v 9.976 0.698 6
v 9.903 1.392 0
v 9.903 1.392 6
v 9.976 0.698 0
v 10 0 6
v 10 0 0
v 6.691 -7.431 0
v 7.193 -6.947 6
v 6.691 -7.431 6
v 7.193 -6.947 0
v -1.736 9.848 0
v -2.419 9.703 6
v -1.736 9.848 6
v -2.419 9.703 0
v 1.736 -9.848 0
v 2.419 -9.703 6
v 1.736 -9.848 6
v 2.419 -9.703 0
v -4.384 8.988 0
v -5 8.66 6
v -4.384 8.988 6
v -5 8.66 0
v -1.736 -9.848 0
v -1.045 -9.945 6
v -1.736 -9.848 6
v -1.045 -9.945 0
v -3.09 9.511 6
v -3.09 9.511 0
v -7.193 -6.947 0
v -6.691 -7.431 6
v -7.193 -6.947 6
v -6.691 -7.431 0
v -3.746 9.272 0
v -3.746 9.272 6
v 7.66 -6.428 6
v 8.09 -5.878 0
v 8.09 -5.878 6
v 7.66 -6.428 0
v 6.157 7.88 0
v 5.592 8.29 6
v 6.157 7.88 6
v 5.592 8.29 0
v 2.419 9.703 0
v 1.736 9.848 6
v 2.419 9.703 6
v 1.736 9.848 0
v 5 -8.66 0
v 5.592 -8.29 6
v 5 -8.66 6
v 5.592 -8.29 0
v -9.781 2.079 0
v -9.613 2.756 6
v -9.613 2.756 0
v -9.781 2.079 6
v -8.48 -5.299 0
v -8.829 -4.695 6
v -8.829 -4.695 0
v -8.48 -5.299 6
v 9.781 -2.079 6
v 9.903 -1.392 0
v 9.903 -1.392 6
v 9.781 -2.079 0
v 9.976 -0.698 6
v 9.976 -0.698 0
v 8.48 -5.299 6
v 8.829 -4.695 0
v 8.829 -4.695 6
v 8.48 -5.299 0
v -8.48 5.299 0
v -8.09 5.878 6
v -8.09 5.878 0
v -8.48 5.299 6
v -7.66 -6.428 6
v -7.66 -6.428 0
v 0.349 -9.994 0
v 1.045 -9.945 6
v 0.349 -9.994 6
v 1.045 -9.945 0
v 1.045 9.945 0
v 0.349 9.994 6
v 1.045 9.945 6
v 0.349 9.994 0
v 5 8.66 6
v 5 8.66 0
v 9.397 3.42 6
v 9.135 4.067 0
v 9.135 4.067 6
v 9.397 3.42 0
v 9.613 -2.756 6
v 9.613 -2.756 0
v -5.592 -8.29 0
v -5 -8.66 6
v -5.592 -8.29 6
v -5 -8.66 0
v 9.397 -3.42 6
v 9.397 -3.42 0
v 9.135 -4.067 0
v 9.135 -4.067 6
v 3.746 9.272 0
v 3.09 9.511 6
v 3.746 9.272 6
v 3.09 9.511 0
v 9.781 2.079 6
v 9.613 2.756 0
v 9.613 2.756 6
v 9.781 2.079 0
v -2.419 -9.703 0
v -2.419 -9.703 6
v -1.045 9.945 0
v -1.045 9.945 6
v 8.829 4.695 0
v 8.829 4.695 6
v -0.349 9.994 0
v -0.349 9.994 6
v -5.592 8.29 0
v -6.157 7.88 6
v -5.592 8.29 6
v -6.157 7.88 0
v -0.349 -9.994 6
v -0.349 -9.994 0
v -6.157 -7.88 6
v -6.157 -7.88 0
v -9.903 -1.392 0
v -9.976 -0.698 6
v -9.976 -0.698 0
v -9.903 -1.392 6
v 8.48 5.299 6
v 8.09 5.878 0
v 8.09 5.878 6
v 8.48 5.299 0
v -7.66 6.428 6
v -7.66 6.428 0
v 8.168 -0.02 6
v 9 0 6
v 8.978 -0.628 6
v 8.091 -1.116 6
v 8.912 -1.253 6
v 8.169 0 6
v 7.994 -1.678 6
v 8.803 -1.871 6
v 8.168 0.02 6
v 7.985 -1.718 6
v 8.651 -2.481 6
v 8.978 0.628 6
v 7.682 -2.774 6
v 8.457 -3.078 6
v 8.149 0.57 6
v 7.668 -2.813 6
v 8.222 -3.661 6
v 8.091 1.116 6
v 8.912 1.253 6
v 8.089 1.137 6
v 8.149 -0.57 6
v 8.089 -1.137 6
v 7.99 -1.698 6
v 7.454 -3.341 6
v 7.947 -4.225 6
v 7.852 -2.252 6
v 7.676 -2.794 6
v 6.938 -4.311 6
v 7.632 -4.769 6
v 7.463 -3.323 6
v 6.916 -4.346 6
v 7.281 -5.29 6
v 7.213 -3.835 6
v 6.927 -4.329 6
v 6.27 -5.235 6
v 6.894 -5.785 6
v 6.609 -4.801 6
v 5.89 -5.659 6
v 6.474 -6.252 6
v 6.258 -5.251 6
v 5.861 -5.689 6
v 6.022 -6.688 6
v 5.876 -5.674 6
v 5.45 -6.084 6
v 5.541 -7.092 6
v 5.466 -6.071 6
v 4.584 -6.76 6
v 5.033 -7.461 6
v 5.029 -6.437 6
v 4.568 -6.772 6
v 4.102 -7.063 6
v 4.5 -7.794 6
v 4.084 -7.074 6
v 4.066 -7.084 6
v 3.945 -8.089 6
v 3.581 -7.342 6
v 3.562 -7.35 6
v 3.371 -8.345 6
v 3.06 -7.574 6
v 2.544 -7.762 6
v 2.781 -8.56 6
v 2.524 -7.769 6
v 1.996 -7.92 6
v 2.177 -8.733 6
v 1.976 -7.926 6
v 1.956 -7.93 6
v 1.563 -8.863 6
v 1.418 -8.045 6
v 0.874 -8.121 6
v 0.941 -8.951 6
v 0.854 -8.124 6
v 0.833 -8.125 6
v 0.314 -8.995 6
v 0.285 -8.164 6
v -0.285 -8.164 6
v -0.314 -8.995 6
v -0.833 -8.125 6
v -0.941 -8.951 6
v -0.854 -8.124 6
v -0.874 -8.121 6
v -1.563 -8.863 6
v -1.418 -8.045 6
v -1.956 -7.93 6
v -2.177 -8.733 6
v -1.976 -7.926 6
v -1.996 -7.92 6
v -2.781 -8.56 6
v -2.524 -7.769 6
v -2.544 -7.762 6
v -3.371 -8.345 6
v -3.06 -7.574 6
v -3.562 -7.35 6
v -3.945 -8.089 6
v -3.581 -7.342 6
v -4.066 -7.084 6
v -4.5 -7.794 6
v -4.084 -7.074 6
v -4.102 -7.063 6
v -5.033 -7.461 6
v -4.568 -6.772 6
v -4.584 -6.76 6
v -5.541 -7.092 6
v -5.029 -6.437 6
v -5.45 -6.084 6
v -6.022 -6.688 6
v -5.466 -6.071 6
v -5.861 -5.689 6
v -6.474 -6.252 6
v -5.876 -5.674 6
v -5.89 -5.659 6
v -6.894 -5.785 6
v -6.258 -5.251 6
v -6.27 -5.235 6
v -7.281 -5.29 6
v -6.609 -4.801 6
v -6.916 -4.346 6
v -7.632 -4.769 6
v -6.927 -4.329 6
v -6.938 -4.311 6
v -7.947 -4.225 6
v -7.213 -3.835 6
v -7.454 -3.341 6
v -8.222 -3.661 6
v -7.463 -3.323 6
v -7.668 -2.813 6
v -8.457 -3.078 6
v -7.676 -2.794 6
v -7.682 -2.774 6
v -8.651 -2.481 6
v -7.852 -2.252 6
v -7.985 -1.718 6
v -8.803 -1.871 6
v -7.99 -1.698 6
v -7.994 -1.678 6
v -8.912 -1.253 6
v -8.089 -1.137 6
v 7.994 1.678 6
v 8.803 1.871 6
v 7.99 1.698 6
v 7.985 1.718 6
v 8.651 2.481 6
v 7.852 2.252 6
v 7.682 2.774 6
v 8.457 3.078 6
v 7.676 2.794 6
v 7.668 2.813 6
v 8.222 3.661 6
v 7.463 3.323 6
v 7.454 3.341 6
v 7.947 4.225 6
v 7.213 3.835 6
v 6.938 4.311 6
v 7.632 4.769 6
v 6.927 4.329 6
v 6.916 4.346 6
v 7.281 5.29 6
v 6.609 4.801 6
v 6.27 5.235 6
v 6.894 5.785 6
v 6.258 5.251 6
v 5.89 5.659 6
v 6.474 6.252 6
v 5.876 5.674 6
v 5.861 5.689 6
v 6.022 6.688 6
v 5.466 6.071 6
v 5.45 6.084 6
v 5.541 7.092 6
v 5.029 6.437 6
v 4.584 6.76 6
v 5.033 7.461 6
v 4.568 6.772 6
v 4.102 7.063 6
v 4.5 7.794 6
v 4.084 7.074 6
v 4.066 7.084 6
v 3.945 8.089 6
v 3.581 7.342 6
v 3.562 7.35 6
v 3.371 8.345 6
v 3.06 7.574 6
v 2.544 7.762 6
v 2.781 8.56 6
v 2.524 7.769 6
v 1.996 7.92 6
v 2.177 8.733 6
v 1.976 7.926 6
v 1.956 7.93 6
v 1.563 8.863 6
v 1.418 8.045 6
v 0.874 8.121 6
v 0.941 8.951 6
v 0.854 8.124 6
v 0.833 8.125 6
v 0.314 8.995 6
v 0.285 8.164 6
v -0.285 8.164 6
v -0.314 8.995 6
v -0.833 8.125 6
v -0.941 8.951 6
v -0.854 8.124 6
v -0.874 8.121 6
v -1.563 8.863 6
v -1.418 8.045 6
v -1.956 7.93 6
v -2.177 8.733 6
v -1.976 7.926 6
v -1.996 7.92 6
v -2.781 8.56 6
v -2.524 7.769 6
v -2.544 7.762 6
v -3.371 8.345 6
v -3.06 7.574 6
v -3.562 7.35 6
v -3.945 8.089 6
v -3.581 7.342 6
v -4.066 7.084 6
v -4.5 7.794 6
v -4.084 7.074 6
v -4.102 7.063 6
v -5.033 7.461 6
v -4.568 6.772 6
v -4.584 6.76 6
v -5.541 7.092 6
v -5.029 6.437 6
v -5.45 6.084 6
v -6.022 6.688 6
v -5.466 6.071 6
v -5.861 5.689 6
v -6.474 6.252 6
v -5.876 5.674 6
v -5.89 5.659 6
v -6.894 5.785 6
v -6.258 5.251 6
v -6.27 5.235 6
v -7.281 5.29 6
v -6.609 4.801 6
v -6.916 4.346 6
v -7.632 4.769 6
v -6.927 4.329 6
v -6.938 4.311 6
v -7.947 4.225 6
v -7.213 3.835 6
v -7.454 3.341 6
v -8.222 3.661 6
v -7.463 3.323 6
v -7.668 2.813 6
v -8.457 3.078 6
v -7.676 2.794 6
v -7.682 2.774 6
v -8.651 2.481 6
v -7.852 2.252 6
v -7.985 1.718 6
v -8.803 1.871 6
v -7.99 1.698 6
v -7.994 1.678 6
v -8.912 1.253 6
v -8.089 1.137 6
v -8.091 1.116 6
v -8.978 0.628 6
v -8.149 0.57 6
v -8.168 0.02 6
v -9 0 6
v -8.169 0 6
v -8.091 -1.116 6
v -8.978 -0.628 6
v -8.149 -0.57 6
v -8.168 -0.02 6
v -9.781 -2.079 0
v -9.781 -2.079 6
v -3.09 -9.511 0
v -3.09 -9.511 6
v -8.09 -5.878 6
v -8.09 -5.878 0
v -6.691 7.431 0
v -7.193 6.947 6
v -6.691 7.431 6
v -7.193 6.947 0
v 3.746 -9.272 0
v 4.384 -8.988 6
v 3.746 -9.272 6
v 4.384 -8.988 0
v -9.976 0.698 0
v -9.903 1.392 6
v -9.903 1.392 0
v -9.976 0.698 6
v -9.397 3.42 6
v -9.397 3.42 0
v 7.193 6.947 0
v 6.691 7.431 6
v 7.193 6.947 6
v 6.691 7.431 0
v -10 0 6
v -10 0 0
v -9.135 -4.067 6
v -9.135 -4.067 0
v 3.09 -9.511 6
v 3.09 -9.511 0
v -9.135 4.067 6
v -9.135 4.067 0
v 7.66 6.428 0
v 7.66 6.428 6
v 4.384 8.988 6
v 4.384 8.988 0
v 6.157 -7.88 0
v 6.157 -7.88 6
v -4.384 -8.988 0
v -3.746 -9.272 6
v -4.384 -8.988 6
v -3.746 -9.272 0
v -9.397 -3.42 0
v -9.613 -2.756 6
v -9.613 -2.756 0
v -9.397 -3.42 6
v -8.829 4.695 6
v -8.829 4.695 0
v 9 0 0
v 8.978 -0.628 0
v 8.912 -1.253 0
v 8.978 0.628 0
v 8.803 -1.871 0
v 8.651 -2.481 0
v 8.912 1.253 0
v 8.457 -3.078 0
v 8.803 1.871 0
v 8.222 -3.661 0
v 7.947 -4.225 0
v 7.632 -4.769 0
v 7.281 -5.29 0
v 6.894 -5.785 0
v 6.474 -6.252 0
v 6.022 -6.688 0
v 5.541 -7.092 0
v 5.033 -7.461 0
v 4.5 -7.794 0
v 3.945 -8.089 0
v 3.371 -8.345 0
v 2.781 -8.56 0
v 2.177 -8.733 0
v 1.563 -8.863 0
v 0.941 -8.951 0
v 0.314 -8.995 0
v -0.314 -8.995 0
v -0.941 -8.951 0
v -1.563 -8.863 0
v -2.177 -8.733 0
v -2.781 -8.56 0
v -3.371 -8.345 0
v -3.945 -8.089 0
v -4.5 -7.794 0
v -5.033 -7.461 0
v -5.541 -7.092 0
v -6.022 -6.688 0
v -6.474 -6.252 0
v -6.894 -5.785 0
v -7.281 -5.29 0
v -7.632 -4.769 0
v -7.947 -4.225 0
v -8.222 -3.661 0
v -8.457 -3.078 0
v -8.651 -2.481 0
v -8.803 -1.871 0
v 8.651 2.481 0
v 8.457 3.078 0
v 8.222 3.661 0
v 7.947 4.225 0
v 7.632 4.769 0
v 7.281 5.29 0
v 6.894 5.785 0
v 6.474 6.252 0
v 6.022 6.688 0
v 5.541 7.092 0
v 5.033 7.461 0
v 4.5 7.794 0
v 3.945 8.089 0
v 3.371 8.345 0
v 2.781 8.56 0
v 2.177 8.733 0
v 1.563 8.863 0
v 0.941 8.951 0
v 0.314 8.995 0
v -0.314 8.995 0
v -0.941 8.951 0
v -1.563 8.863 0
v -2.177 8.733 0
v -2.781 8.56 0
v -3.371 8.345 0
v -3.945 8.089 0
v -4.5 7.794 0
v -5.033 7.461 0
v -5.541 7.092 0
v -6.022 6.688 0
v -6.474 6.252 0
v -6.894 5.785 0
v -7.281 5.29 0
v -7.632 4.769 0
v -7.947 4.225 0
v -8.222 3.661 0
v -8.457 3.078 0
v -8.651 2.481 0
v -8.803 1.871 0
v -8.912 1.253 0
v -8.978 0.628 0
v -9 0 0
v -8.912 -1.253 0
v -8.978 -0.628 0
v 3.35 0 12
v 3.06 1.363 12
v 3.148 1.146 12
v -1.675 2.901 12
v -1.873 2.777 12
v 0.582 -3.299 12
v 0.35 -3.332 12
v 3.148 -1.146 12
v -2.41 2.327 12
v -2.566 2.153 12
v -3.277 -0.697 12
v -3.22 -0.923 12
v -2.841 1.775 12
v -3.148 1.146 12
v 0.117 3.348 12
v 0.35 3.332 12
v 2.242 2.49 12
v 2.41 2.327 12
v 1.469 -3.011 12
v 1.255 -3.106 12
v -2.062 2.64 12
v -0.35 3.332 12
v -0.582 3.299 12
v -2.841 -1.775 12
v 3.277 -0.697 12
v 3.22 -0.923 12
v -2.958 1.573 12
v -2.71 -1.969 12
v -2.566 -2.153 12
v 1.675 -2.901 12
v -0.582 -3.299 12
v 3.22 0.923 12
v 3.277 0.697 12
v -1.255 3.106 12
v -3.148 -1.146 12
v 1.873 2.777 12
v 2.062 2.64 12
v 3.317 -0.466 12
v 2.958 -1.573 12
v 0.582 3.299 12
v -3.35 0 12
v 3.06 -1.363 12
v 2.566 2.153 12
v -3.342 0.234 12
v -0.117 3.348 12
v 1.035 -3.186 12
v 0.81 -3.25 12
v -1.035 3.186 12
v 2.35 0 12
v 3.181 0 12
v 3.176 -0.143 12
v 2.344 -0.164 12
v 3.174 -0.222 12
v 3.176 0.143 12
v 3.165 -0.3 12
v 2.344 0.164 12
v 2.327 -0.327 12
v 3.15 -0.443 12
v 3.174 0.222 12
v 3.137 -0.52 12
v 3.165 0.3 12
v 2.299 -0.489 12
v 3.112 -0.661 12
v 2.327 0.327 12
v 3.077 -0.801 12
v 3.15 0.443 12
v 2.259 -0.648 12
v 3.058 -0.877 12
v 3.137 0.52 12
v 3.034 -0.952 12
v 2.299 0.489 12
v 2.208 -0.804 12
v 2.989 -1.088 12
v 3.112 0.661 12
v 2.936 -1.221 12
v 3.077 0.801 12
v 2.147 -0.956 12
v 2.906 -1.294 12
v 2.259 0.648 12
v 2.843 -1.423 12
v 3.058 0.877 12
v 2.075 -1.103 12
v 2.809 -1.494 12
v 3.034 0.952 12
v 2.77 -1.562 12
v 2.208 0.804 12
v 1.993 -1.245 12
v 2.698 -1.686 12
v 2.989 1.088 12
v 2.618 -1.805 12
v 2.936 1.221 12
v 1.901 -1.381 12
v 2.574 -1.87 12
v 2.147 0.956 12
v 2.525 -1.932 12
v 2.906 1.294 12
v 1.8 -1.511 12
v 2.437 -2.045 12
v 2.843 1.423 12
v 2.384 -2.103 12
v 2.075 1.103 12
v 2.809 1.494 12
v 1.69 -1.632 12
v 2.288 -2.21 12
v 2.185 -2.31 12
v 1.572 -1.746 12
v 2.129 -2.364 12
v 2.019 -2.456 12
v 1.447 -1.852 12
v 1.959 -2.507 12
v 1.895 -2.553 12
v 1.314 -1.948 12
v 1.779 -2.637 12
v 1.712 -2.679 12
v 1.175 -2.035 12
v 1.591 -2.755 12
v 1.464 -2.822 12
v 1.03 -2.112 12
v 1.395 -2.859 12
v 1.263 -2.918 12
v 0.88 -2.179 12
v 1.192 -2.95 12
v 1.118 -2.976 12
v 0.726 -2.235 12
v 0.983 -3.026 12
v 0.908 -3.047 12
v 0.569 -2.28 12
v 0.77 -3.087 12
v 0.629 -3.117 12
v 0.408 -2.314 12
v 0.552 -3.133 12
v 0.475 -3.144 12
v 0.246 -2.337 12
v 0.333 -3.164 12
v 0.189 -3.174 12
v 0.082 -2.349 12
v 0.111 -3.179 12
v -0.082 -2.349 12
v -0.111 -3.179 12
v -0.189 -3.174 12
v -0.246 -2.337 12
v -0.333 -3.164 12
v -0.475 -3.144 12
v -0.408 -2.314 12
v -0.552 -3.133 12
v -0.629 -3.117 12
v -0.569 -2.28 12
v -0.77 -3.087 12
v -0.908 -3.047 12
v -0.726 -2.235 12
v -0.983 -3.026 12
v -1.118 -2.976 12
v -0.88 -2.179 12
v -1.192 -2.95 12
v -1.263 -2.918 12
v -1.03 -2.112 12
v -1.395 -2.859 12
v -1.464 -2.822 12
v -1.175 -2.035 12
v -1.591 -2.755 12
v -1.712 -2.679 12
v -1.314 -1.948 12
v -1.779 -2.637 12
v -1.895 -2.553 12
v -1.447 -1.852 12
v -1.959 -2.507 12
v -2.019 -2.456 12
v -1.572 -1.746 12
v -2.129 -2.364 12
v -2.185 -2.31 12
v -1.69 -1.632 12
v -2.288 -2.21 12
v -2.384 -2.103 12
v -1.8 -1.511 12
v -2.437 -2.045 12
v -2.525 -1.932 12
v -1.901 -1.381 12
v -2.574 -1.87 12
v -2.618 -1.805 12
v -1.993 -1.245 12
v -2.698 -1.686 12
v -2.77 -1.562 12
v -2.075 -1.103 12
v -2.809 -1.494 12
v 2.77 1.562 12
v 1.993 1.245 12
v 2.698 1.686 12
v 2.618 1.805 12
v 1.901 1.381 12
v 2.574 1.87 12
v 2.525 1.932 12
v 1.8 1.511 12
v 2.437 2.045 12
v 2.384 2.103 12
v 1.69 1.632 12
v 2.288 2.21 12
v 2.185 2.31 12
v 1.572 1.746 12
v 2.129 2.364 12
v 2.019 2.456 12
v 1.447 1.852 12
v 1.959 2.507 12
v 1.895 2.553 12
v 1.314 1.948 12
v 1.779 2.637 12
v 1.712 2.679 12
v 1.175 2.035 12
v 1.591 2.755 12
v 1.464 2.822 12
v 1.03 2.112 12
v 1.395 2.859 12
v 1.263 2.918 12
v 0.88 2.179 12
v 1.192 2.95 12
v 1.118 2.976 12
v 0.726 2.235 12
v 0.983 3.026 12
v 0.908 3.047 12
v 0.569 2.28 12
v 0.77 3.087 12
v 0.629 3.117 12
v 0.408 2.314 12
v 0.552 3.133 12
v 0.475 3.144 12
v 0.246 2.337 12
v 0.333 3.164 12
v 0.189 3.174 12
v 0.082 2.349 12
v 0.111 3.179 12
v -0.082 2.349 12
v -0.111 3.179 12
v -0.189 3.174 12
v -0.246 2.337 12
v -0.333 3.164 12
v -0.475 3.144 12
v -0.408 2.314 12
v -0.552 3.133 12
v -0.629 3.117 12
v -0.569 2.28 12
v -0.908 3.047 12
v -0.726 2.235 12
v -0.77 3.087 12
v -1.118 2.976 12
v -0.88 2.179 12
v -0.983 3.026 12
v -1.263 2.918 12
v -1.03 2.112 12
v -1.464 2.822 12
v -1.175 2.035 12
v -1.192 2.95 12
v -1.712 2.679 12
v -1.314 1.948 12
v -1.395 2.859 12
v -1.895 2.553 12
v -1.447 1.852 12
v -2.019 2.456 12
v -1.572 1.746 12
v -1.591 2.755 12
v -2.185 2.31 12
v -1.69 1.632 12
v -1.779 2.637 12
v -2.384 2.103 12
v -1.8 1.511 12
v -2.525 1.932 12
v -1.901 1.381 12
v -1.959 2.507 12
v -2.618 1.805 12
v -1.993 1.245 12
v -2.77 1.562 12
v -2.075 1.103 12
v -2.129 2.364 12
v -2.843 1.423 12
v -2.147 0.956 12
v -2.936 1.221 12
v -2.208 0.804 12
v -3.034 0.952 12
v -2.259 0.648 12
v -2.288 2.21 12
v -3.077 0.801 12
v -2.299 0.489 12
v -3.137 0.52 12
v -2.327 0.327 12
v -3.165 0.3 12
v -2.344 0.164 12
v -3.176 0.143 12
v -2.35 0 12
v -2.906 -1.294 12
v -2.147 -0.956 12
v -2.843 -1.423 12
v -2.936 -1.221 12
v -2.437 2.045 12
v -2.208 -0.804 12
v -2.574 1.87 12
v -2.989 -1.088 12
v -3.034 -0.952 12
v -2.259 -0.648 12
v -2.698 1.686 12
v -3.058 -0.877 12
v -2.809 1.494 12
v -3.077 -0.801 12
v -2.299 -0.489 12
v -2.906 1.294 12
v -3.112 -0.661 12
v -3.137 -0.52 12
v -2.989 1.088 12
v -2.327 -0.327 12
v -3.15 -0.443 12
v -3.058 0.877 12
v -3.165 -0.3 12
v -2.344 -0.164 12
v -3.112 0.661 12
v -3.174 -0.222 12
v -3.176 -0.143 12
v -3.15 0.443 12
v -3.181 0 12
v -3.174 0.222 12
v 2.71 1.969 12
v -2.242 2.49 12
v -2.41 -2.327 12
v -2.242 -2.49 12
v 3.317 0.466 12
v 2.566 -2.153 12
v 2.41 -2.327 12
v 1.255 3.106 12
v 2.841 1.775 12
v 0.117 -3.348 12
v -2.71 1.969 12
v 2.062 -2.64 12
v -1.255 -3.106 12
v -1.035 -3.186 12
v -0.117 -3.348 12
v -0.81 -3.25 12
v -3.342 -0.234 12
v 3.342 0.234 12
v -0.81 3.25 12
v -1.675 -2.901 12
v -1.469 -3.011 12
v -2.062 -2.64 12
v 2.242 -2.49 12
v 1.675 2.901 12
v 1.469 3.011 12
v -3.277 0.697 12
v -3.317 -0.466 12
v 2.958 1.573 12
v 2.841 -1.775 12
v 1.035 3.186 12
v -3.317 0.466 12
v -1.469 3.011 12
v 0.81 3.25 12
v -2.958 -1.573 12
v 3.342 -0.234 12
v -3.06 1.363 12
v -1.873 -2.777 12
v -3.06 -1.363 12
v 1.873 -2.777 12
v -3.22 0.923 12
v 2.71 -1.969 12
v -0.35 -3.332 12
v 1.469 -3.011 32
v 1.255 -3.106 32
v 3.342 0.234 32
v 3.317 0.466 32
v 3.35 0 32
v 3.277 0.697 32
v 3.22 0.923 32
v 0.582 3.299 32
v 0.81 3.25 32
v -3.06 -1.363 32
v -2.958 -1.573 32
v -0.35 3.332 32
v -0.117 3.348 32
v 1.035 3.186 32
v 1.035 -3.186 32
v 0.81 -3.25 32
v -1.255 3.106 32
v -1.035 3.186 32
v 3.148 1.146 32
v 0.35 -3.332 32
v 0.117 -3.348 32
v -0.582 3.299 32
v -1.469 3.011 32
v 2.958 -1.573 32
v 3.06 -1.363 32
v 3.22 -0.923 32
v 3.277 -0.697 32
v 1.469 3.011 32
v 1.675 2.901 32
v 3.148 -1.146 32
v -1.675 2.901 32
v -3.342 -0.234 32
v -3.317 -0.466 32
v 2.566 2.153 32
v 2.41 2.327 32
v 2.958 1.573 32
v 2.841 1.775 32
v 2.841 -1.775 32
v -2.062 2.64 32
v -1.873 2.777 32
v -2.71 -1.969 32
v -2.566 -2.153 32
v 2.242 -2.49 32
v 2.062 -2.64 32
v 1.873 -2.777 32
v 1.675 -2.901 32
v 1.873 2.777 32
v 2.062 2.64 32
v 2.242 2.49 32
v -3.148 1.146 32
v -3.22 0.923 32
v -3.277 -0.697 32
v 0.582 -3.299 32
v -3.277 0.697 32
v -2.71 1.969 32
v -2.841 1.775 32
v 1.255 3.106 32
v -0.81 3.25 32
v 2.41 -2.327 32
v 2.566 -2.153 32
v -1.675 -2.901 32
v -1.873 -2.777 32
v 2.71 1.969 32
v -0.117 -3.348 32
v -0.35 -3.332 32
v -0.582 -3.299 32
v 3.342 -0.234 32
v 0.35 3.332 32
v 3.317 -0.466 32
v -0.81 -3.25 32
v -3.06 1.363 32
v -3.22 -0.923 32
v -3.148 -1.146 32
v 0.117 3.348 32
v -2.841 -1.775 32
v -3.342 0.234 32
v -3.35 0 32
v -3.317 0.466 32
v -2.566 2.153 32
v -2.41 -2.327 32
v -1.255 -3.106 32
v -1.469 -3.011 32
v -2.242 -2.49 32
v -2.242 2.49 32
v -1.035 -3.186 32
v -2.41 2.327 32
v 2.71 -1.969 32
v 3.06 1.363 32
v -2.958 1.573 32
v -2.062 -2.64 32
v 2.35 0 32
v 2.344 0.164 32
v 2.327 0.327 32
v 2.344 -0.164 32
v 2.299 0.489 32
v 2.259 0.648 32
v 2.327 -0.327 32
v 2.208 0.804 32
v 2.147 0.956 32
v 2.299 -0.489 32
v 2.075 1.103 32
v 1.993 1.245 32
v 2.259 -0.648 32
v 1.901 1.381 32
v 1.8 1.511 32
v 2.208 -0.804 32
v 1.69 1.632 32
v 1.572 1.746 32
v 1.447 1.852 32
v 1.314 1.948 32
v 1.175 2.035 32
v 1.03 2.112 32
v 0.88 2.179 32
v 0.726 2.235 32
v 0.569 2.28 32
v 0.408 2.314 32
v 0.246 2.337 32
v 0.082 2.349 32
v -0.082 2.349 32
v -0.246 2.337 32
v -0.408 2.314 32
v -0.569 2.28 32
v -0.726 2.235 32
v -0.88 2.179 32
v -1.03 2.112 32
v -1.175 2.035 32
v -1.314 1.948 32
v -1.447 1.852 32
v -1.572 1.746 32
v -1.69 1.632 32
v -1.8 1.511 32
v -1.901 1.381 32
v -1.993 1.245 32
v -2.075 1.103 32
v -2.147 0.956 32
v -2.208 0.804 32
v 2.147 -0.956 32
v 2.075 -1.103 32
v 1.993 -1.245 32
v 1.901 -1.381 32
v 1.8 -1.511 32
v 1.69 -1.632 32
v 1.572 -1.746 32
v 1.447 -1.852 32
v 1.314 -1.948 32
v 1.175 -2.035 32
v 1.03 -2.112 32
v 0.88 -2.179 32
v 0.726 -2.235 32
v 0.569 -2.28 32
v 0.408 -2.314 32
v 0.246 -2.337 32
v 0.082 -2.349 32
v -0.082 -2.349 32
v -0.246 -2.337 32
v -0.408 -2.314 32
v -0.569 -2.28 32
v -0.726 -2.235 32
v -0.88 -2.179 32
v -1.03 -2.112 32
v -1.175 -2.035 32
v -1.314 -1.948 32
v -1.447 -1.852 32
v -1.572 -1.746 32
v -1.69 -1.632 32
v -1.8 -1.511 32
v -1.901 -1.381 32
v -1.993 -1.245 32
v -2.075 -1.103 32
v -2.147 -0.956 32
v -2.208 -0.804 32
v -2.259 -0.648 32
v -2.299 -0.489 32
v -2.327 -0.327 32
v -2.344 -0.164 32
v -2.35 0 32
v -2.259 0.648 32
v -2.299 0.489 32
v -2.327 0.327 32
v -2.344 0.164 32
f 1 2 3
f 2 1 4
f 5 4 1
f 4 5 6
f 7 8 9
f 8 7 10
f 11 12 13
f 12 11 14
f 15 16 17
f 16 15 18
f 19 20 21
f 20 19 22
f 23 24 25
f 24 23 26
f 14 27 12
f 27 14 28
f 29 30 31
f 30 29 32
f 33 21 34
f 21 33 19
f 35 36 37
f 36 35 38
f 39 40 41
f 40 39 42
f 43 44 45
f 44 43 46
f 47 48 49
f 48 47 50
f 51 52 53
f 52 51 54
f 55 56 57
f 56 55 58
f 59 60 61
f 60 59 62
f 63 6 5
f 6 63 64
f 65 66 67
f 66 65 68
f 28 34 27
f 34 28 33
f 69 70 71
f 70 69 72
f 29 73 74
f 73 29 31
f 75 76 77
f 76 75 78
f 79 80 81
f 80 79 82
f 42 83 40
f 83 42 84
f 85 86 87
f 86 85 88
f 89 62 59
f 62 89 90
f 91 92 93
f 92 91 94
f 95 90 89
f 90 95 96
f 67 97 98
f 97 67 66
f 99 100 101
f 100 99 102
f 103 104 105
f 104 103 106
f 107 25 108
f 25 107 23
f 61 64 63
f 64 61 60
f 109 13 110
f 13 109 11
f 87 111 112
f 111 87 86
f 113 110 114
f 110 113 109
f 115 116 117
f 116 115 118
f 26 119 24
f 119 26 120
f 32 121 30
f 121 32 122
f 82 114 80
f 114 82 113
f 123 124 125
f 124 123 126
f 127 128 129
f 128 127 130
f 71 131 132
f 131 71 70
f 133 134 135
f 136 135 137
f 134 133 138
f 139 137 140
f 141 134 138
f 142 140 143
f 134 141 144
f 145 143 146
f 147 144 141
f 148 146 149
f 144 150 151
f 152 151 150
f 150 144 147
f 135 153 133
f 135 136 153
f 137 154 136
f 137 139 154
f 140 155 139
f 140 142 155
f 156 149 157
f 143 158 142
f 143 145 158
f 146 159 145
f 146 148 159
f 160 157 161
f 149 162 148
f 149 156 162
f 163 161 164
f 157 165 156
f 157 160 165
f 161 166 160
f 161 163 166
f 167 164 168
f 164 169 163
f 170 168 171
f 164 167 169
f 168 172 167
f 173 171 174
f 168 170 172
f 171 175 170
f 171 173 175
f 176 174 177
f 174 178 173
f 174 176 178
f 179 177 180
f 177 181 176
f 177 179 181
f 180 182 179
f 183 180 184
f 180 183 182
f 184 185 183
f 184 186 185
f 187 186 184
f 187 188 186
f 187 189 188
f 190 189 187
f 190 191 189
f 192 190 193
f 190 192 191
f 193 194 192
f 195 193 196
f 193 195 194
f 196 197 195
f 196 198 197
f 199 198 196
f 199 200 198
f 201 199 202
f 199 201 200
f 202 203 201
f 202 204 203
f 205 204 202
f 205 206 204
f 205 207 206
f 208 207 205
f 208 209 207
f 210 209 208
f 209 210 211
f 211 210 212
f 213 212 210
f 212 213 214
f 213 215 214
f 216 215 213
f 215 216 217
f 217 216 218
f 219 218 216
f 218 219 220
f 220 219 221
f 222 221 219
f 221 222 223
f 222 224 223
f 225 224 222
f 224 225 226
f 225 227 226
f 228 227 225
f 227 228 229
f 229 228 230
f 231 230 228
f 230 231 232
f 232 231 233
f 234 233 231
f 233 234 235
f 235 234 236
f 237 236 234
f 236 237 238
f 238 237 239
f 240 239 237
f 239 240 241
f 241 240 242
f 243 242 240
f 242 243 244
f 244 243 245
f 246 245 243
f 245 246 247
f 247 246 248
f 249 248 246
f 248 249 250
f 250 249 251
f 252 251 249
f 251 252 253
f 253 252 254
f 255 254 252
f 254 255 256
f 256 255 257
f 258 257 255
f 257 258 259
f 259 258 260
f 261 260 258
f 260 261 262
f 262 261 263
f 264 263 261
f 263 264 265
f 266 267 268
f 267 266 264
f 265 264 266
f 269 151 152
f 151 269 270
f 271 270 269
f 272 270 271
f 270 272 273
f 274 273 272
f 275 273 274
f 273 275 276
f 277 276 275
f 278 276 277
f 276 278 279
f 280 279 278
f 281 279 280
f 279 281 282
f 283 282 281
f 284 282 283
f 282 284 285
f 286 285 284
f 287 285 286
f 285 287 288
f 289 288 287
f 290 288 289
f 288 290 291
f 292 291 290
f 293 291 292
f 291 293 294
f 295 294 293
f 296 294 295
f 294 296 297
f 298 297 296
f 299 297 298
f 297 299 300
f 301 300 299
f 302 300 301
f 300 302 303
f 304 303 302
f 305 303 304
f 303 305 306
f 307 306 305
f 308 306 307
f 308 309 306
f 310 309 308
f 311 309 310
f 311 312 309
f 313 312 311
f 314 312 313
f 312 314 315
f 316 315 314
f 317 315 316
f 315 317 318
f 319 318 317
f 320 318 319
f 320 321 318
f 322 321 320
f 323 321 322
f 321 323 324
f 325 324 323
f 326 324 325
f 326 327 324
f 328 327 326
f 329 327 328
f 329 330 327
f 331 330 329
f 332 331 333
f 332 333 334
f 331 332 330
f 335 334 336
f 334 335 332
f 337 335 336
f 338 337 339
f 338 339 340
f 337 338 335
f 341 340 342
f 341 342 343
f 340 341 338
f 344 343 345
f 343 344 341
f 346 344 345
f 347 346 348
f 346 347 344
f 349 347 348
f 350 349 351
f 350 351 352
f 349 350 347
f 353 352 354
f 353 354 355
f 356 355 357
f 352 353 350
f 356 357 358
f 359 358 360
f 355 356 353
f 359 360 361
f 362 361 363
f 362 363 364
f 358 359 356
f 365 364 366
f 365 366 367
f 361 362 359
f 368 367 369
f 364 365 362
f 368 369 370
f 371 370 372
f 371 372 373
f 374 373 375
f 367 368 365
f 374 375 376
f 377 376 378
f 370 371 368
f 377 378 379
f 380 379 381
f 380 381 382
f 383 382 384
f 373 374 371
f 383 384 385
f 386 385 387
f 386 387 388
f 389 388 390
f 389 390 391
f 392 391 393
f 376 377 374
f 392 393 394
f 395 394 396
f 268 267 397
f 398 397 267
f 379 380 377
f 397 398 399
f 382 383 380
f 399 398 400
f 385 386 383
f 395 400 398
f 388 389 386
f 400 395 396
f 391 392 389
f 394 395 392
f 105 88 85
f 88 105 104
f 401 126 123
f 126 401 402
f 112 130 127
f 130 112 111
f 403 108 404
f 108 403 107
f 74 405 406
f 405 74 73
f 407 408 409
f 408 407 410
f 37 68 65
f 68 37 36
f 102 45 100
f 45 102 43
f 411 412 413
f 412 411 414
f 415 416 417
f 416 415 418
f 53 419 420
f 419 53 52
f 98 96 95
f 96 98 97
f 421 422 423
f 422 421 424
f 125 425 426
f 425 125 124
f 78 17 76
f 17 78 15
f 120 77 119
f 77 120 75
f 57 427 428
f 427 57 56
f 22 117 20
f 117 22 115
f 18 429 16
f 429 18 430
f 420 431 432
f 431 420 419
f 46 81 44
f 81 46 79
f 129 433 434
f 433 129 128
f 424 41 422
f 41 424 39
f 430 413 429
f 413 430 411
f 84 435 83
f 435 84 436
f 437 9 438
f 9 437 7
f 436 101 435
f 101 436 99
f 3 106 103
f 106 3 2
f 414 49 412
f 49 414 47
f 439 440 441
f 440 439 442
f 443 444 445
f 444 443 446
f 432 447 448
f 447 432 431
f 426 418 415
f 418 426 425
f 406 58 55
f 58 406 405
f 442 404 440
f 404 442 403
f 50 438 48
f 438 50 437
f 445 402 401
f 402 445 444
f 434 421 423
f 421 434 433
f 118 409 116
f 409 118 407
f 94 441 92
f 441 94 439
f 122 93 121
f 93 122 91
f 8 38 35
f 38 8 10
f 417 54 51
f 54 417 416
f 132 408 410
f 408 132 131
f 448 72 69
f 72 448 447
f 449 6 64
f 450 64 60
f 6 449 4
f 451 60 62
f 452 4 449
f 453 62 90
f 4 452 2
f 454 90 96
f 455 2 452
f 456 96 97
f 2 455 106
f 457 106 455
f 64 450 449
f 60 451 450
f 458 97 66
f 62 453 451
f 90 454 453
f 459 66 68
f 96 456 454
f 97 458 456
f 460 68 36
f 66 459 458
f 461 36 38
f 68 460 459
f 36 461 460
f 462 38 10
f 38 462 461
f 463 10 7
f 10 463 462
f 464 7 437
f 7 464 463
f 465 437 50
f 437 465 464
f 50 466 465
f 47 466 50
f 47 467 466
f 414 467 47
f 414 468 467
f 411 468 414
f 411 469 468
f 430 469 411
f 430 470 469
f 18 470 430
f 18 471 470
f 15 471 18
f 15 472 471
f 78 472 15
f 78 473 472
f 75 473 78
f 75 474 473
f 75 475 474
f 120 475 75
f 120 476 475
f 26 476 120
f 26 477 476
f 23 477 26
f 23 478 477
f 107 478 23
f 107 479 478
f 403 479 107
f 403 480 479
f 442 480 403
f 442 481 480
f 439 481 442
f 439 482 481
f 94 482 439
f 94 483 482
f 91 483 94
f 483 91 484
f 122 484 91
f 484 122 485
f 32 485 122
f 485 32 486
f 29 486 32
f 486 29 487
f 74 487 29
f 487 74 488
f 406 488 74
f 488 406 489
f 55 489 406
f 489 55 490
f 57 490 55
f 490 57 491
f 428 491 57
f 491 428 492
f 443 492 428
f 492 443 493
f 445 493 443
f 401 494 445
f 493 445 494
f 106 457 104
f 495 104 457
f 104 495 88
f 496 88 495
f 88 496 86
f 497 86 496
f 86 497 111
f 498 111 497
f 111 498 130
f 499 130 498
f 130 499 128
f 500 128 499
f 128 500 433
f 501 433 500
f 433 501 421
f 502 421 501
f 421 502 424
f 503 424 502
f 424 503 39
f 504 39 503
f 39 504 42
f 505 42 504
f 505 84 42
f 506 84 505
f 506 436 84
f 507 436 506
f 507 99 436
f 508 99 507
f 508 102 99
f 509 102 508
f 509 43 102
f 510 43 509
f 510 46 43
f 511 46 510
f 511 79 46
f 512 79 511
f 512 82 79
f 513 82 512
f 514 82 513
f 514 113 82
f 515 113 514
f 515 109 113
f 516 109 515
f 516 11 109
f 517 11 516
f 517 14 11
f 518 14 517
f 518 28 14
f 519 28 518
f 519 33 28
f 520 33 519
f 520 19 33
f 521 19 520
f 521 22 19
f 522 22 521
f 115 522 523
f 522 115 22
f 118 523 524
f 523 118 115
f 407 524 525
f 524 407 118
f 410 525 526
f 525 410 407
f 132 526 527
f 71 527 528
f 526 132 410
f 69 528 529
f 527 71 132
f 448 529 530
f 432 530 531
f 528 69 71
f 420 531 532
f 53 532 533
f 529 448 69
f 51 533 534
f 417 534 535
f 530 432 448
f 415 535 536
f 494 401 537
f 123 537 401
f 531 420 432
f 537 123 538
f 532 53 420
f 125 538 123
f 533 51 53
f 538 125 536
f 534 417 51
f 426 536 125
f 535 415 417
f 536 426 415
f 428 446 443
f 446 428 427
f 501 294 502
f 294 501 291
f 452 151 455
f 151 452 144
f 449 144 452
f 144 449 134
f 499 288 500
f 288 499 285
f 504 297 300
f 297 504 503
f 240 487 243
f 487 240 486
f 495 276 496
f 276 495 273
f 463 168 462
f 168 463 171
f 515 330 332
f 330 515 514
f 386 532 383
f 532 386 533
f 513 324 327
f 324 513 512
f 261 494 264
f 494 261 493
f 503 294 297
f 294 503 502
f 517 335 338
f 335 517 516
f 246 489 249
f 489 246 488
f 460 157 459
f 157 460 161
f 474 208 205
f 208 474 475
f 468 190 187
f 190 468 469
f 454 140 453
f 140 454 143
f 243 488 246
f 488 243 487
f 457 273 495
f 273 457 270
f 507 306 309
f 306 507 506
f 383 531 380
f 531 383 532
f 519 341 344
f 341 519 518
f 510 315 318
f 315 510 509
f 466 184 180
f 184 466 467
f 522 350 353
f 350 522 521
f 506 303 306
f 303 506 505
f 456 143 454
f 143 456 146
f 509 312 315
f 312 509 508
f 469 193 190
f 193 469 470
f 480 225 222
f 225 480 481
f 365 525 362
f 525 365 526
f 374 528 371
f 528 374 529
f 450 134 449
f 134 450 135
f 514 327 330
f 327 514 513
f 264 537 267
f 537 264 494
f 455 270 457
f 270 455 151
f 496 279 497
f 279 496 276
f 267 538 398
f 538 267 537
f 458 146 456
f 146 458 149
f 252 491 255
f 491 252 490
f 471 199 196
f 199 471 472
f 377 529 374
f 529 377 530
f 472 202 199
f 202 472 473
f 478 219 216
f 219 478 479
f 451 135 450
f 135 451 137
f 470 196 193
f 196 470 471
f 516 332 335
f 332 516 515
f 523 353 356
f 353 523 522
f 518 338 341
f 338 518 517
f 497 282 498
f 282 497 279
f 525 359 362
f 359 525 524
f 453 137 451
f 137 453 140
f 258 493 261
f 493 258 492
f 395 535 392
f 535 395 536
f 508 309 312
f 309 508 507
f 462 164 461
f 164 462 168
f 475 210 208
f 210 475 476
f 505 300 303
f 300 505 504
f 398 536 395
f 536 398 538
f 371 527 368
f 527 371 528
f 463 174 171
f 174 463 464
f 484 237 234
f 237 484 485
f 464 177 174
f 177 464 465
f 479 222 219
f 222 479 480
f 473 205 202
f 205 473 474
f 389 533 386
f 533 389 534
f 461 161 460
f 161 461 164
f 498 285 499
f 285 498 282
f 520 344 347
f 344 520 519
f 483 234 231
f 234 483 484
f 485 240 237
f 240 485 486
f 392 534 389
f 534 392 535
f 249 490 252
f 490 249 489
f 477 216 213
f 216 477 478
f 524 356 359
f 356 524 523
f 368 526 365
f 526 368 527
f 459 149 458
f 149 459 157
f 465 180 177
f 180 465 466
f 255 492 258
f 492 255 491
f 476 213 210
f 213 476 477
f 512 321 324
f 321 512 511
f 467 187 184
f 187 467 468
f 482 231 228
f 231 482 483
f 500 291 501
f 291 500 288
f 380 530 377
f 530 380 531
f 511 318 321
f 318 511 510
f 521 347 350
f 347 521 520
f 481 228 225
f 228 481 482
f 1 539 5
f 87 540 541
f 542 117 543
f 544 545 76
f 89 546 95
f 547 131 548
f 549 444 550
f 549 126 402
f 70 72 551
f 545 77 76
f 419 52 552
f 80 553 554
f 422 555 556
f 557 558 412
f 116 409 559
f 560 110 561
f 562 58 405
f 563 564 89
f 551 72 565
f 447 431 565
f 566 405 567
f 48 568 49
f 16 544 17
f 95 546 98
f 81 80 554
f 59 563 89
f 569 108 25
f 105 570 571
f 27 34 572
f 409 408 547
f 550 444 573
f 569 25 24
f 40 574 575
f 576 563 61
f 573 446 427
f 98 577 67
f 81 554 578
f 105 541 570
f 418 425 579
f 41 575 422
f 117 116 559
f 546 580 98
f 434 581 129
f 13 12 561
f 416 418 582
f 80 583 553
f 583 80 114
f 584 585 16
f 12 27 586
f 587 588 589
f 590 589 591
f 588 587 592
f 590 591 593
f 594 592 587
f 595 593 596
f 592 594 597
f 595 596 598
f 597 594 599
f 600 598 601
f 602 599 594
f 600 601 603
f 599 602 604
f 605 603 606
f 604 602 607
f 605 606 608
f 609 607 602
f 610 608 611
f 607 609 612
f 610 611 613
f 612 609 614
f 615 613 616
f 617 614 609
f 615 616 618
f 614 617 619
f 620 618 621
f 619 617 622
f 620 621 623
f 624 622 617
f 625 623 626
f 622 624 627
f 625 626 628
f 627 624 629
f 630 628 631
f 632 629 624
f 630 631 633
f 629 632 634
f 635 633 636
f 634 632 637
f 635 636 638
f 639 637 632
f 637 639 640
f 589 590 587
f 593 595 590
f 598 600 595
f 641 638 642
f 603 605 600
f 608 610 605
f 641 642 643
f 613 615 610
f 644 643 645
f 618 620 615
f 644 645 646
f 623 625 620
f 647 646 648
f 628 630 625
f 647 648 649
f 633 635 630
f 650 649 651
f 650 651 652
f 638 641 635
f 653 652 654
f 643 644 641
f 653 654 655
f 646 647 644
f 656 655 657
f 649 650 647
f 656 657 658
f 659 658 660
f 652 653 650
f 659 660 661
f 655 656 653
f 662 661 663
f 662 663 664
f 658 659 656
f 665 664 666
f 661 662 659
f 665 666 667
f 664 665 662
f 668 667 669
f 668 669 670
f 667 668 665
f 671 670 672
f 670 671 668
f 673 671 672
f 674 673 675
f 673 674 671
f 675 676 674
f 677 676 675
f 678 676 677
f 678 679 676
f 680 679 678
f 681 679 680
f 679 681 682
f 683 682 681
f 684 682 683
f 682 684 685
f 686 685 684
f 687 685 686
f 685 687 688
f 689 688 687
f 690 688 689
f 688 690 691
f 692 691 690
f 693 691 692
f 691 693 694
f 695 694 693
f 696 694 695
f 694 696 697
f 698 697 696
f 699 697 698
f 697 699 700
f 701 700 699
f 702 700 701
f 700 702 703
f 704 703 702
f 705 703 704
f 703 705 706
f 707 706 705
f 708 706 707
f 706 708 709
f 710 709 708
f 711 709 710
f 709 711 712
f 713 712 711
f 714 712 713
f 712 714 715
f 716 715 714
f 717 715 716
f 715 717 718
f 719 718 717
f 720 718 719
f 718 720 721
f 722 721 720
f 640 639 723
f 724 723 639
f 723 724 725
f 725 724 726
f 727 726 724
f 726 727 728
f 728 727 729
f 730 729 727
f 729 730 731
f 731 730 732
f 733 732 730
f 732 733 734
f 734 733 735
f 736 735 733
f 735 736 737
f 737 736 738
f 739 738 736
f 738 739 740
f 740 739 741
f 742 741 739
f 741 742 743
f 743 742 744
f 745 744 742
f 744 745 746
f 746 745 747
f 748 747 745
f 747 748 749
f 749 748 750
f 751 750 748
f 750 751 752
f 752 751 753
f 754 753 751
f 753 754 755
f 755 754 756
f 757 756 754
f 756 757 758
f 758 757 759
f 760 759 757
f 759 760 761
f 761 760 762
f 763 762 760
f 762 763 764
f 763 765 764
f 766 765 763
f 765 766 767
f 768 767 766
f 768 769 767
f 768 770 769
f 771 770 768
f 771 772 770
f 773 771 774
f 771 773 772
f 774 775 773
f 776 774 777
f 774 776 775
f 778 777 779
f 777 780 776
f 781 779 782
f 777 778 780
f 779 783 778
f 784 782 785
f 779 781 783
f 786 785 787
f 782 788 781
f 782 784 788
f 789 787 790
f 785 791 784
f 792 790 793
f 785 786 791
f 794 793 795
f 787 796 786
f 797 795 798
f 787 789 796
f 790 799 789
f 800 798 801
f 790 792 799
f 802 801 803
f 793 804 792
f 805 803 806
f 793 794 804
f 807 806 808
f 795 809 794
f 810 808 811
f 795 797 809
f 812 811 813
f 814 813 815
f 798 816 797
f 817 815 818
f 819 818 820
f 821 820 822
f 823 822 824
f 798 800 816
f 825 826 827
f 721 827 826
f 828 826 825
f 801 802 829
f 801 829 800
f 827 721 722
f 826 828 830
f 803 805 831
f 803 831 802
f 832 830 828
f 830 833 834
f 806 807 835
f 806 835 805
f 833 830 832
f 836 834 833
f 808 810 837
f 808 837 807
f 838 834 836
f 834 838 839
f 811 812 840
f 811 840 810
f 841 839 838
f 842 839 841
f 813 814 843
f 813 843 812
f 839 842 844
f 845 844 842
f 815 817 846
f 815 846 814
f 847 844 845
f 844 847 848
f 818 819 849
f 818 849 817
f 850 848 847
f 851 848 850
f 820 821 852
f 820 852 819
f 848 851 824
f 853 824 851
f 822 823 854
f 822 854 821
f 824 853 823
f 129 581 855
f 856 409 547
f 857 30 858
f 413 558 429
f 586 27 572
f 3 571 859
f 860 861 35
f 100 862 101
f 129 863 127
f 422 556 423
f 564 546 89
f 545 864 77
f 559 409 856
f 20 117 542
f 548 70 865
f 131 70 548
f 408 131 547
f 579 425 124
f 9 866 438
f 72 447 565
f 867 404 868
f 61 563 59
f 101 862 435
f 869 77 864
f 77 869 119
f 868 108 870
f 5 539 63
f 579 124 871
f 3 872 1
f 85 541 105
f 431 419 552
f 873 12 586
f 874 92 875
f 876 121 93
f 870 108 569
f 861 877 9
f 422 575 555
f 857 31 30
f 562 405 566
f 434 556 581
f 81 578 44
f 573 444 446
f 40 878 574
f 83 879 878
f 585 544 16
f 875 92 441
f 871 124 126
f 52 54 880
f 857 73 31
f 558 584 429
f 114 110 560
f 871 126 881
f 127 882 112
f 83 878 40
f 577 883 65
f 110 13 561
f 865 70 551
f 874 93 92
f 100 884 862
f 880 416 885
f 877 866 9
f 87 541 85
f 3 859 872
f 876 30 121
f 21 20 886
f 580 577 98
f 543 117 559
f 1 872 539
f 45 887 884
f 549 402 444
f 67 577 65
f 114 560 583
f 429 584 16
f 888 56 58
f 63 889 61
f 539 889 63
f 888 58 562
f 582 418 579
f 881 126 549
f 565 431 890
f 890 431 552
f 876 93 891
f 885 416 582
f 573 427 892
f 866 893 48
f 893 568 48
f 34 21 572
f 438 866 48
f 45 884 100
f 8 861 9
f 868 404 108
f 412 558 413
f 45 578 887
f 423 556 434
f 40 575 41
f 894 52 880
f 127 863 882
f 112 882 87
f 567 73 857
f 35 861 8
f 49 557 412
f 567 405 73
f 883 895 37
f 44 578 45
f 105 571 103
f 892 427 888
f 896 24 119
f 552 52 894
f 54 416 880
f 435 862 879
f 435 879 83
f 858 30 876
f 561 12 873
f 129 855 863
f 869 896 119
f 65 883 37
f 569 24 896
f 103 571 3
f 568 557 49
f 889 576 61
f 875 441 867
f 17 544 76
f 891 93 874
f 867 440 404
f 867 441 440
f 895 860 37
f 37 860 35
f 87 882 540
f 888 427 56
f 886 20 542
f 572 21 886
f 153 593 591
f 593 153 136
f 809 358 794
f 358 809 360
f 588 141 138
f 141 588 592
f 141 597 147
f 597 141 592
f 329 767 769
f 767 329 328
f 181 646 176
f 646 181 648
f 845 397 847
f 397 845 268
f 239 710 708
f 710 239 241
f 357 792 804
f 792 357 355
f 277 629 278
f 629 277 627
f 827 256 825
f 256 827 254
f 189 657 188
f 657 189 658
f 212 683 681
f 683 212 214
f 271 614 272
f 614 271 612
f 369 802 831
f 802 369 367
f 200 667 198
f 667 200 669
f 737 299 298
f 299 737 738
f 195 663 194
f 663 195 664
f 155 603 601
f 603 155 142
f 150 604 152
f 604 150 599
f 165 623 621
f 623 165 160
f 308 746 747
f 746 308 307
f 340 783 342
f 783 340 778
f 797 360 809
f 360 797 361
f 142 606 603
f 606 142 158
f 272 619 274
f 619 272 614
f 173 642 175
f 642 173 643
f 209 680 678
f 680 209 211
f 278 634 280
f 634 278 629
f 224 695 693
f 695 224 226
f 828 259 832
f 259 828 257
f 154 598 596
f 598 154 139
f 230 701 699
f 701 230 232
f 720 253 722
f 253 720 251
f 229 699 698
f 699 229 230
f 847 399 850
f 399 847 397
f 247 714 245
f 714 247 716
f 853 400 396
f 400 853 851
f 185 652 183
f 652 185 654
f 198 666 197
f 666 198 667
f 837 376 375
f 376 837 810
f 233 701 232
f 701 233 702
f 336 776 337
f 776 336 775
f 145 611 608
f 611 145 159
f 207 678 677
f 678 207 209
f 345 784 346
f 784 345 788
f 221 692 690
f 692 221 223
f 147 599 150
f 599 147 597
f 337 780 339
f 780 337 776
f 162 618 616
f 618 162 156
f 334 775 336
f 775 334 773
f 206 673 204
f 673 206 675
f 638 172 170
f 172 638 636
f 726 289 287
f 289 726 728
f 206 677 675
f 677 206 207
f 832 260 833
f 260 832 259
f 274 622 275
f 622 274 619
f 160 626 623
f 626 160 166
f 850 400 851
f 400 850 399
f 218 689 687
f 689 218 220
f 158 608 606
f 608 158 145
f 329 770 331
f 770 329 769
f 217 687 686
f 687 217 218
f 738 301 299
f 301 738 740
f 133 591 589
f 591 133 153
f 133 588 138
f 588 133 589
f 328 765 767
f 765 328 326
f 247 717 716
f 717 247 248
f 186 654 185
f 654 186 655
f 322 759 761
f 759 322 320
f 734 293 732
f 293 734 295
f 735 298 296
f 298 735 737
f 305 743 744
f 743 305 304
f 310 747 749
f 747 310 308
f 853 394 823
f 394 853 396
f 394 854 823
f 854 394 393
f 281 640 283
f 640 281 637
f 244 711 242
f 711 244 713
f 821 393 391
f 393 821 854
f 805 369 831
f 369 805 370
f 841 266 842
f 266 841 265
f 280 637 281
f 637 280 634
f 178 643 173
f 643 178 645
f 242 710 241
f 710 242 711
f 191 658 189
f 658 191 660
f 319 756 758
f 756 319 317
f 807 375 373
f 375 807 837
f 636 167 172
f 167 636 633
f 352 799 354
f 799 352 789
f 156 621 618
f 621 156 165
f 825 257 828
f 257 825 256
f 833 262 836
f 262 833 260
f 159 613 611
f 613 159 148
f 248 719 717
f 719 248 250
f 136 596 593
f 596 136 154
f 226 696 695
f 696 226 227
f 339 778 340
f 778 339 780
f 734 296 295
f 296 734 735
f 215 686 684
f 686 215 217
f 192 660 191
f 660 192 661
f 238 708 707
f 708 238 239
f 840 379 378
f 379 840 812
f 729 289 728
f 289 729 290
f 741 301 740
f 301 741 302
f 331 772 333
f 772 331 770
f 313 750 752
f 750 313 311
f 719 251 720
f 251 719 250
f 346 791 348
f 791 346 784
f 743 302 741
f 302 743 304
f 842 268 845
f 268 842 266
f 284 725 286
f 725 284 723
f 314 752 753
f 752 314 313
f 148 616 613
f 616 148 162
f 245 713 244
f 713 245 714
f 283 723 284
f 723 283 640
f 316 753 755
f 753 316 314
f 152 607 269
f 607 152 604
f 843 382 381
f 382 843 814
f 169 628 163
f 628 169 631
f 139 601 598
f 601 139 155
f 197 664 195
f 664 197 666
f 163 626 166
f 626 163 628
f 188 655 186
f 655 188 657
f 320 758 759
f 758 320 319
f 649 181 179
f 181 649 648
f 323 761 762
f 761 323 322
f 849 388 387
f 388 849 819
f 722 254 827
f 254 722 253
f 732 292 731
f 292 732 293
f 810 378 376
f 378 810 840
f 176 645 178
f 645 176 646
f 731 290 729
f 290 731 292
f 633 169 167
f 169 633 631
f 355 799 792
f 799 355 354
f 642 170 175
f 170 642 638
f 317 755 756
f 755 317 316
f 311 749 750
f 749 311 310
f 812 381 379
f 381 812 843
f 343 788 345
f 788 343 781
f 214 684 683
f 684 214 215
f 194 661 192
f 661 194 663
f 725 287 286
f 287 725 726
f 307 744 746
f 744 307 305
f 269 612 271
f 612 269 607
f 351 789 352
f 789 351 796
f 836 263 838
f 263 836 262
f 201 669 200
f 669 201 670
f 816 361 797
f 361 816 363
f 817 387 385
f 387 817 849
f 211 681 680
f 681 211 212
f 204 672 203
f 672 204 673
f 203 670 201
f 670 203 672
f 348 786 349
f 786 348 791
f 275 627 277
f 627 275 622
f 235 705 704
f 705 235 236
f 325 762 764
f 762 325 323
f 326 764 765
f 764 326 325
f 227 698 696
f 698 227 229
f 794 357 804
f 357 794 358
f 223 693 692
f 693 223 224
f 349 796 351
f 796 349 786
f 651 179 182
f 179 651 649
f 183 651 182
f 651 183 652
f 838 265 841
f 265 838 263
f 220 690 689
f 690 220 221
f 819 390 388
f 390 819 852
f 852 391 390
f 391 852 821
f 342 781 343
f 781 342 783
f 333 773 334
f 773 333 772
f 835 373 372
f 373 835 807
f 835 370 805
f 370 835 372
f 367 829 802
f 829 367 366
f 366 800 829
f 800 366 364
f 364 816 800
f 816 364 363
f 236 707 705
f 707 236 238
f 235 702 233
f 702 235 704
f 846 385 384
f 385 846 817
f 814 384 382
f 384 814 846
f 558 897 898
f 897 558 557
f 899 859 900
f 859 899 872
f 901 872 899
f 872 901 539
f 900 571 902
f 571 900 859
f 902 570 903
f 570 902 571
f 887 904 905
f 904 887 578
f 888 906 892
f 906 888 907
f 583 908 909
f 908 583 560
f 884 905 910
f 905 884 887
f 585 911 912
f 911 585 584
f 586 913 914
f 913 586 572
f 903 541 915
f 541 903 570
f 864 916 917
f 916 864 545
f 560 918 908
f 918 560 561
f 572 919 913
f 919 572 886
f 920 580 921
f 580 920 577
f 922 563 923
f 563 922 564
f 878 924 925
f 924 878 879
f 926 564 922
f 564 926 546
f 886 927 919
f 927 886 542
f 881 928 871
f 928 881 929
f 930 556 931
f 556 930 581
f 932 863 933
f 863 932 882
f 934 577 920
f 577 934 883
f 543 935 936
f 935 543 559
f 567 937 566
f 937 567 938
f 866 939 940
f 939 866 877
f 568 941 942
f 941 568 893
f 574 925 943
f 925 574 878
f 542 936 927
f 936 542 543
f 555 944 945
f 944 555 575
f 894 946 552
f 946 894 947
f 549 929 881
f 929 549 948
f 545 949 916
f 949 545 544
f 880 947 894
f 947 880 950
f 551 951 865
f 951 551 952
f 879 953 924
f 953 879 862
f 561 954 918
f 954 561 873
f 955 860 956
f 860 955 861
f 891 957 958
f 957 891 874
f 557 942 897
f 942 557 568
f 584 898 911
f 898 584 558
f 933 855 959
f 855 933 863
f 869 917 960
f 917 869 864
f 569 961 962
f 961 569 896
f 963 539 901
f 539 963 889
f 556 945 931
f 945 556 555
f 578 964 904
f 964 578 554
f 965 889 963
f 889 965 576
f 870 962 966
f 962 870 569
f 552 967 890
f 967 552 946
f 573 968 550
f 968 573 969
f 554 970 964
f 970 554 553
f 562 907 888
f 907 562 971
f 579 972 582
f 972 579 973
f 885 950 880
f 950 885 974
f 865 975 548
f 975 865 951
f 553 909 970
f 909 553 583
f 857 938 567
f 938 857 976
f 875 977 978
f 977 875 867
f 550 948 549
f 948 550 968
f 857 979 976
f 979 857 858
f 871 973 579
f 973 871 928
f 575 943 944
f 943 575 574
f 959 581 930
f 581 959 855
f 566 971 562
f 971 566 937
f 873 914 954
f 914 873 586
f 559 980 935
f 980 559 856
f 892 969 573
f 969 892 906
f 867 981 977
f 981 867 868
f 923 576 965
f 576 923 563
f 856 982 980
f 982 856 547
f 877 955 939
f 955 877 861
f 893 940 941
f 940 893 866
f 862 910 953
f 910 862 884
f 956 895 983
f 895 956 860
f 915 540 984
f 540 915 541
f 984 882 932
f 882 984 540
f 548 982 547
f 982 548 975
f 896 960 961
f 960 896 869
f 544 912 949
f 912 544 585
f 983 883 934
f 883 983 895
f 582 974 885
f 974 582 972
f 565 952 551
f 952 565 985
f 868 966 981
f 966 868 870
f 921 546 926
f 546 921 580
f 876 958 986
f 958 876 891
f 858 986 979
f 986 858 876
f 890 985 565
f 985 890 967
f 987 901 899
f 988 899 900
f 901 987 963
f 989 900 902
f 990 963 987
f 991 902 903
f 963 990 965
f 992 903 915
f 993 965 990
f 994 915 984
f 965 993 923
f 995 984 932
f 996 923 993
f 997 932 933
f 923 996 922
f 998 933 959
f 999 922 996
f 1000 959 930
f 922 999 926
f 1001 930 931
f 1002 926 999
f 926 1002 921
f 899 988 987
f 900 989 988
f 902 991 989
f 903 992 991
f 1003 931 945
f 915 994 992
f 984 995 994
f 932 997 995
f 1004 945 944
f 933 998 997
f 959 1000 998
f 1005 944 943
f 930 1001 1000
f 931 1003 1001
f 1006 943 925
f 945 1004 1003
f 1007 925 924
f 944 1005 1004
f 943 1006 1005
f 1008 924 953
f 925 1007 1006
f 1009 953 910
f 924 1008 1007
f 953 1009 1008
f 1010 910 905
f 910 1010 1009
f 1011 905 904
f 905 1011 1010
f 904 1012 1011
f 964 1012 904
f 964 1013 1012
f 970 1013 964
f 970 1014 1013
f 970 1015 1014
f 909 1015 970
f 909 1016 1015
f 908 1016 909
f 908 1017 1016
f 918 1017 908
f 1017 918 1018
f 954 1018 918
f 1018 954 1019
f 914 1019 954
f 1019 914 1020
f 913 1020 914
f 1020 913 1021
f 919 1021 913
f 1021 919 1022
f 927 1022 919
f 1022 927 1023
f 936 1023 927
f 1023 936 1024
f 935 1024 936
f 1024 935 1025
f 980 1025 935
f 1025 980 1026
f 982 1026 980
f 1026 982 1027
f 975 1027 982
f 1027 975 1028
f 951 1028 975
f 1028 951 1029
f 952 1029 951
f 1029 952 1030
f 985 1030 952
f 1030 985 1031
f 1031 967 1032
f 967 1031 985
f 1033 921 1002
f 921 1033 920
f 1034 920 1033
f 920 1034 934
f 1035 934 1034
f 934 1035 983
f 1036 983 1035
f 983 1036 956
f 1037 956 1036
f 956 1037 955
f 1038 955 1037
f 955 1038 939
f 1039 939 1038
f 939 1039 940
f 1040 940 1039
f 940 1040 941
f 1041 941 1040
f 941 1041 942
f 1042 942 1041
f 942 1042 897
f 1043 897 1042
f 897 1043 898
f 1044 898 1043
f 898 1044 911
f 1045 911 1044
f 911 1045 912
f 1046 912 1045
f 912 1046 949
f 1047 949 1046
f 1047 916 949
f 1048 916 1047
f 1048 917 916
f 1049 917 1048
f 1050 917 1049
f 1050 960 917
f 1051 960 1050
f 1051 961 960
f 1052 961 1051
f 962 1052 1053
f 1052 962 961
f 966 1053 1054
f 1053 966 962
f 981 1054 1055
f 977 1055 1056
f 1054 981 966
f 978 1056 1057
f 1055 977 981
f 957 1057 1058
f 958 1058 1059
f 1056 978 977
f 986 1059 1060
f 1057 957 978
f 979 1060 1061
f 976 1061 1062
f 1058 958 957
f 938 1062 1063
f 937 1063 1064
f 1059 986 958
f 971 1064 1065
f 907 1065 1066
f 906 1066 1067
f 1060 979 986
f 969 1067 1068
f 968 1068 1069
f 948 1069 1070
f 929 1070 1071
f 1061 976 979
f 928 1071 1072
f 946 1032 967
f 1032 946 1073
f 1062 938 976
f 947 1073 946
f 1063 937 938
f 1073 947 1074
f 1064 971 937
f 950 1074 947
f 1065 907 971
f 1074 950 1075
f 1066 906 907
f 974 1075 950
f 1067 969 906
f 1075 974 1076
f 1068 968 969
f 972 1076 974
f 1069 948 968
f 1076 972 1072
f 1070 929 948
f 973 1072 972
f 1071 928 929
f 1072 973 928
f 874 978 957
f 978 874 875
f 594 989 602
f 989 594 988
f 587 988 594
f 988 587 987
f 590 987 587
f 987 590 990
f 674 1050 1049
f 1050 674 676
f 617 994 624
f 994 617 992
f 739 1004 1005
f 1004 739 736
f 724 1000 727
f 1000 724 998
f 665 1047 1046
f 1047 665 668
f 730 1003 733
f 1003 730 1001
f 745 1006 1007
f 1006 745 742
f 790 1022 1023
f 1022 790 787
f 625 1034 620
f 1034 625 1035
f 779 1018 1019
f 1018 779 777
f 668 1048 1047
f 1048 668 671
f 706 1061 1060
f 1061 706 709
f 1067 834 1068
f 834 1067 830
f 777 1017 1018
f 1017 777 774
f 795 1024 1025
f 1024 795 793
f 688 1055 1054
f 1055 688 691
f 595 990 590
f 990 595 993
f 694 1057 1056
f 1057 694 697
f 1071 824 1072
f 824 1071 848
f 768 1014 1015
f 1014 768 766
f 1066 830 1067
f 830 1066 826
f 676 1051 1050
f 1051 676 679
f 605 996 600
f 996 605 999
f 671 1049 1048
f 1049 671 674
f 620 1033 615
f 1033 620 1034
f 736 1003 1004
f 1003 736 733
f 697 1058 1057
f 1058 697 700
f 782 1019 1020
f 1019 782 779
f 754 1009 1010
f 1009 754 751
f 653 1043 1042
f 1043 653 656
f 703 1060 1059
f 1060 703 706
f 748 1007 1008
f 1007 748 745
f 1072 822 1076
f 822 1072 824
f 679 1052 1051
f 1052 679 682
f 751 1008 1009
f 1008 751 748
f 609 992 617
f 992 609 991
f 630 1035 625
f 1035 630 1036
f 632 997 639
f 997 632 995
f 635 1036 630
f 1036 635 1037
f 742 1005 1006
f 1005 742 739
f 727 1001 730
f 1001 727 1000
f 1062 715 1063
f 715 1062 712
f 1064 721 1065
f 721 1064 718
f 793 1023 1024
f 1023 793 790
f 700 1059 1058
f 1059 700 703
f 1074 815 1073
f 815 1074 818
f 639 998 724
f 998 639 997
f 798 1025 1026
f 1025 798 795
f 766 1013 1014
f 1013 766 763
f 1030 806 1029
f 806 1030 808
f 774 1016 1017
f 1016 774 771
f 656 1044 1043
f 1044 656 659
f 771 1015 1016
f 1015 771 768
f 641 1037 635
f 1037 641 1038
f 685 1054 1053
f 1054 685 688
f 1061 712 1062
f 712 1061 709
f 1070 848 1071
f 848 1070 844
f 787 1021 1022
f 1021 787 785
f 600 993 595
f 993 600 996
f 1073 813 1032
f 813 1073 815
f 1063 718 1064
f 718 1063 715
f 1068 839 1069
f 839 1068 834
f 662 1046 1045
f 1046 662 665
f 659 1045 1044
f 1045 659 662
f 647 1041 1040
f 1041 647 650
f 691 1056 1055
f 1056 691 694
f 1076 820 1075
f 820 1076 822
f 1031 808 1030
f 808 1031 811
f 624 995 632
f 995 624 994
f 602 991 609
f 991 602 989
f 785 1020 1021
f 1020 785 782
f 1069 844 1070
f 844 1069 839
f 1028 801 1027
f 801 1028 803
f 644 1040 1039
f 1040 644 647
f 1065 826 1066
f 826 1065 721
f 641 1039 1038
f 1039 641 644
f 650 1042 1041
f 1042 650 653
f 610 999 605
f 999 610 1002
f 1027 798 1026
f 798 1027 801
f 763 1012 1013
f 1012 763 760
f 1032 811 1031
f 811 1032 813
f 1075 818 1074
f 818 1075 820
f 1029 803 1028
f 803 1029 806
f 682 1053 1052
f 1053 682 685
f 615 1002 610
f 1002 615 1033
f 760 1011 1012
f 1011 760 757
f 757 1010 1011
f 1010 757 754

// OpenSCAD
// imbuto.scad

// Just a simple parametric funnel
// modify child modules regardless of how the child geometry
// is created.

$fn = 90;

// funnel entrance diameter 
d_ext=20.0;

// funnel output diameter
d_small = 6.7; 

// heigt of the nail
h_fun_1=6.0;

// height of the cylinder
h_fun_2=6.0;

// height of border
h_fun_3=20.0;

// thickness (used for empty funnel)
th_alu=1.0; 

// empty funnel
empty = true;

module funnel(d1, d2,h1,h2,h3,th,empty=true){
    union(){
        difference(){
            cylinder(h=h1, d=d1);
            if (empty) translate([0,0,-1])
                cylinder(h=h1+2,d=d1-2*th);
        }
        difference(){
            translate([0,0,h1])
                cylinder(h=h2,d1=d1, d2=d2);
            if (empty) translate([0,0,h1-1])
                cylinder(h=h2+2,d1=d1-2*th, d2=d2-2*th);
        };
        difference(){
            translate([0,0,h1+h2])
                cylinder(h=h3,d=d2);
            if (empty) translate([0,0,h1+h2-1])
                cylinder(h=h3+2,d=d2-2*th);
        };
    }
}

funnel(d_ext,d_small,h_fun_1,h_fun_2,h_fun_3,th_alu,empty);
/*
translate([1.5*d_ext,0,0])funnel(d_ext-2*th_alu,d_small-2*th_alu,
        h_fun_1/2,h_fun_2,1.5*h_fun_3,th_alu);

*/
